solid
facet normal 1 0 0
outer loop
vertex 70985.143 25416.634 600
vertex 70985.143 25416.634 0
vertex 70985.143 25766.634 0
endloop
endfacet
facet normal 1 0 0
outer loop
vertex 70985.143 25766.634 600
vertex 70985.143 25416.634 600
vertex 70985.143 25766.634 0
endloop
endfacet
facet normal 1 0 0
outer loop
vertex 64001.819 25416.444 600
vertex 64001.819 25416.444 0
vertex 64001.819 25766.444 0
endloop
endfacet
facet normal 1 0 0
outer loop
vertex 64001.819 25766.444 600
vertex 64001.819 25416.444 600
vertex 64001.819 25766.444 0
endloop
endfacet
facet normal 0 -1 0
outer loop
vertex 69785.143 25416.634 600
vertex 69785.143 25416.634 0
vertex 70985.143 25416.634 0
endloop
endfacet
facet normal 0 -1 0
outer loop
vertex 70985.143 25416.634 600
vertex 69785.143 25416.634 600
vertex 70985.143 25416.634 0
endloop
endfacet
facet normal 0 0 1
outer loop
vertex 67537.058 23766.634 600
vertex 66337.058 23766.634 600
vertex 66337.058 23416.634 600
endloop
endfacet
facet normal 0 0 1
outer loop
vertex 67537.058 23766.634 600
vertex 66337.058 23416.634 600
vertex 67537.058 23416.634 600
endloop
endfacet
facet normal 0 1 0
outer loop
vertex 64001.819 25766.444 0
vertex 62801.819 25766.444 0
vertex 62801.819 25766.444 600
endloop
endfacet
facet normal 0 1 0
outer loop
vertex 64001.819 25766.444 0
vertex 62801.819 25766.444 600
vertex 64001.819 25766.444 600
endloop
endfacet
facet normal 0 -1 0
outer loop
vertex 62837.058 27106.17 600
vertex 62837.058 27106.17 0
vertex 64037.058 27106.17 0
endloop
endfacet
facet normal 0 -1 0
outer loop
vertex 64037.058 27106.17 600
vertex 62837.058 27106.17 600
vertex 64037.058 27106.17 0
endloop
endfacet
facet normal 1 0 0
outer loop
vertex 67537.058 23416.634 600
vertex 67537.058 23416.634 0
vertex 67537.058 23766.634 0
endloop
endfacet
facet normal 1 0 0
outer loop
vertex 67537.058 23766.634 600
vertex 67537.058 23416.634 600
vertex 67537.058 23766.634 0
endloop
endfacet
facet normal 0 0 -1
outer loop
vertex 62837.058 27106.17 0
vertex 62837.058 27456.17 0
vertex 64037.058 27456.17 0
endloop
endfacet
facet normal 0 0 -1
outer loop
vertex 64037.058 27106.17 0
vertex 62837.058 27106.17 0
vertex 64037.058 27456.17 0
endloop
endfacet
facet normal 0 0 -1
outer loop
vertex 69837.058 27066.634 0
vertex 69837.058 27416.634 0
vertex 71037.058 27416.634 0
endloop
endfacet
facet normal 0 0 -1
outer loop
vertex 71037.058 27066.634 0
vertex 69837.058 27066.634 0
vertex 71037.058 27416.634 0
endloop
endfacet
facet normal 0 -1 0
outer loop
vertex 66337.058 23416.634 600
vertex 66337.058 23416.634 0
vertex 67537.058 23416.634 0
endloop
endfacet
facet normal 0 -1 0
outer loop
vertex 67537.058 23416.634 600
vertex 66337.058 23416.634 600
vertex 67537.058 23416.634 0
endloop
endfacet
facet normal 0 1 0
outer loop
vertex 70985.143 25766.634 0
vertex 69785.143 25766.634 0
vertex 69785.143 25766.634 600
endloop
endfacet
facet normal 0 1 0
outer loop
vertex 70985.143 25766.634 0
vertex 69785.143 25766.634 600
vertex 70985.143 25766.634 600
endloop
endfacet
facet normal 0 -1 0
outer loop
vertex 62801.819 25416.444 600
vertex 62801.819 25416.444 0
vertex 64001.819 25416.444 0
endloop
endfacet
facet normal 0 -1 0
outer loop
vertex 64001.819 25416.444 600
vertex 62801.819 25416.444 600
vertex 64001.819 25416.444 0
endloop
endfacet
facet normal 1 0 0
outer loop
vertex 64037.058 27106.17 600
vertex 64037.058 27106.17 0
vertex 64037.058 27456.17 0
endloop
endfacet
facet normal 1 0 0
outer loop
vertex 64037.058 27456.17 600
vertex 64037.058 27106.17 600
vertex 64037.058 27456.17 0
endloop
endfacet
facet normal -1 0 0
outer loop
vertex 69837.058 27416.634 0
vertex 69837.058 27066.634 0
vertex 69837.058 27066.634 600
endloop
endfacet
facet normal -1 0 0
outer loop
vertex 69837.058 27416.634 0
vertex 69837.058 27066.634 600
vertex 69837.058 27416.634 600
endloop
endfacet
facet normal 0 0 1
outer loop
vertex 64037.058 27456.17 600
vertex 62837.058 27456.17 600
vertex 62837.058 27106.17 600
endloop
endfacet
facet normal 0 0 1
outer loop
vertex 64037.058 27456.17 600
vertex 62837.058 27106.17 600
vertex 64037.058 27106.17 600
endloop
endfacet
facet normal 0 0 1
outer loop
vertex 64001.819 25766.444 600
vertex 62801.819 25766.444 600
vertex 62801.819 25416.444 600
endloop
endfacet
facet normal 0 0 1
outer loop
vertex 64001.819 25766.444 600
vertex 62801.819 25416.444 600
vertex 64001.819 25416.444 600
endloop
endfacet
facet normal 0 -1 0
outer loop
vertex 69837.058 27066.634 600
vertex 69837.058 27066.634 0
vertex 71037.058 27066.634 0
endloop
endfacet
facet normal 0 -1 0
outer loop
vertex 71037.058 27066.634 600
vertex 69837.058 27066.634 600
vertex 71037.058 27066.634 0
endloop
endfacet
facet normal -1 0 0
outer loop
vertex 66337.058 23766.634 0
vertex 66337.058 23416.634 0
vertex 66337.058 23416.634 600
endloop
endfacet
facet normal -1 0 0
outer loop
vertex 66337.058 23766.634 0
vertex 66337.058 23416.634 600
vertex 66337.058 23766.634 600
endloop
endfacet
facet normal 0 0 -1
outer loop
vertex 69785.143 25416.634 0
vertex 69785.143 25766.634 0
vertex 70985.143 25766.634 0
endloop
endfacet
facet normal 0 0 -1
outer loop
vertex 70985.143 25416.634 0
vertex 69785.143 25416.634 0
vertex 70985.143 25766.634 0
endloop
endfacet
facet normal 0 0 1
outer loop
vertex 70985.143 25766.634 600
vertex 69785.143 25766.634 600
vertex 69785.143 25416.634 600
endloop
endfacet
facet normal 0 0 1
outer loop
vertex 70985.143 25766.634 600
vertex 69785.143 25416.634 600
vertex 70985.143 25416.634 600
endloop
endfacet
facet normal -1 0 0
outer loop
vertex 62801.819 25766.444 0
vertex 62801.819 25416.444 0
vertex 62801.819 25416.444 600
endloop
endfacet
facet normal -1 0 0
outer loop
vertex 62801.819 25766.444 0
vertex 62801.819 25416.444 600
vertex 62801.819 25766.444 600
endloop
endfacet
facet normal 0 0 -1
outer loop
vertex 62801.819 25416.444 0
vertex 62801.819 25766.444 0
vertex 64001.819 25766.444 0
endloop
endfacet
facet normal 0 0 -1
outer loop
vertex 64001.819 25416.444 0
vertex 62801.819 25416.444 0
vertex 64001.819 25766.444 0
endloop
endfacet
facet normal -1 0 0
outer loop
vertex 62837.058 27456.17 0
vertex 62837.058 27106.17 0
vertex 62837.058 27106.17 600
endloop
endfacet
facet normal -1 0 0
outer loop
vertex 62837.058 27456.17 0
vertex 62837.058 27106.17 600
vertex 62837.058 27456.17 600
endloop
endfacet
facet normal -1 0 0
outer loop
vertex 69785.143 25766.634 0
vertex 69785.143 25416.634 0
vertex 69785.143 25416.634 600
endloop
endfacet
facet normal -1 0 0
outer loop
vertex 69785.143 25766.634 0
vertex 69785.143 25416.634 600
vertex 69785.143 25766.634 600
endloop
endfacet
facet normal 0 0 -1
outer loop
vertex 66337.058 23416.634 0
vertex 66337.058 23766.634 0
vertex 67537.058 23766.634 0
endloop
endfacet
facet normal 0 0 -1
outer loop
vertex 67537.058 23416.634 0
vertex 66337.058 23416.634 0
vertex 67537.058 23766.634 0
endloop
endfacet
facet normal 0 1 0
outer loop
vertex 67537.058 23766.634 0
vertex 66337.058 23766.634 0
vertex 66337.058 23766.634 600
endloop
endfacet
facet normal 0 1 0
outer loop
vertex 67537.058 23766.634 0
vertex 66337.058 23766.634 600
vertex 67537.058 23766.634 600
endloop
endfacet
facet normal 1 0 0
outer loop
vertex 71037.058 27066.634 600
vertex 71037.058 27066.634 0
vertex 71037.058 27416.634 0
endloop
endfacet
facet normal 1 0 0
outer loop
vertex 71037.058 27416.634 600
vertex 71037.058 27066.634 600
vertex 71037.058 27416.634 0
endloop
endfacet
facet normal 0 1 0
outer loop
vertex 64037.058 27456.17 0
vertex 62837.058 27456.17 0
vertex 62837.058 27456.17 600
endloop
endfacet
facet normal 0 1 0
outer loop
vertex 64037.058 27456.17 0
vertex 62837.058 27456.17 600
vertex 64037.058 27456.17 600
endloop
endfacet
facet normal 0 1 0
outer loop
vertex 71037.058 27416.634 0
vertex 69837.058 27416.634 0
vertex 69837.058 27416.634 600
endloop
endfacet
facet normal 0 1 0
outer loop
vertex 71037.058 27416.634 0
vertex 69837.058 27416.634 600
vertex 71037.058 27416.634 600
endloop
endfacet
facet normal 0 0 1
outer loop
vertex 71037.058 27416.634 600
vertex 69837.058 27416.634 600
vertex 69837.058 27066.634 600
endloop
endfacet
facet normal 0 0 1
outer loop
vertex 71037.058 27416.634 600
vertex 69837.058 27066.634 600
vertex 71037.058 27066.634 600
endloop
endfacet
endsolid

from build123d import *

# Parameters (mm, degrees)
SKETCH1_W        = 1200
SKETCH1_H        = 350
EXTRUDE1_DEPTH   = 600
EXTRUDE1_2_DEPTH = 600
EXTRUDE1_3_DEPTH = 600
EXTRUDE1_4_DEPTH = 600
EXTRUDE1_5_DEPTH = 600


with BuildPart() as part:
    # Sketch1 → Extrude1 (new body)
    with BuildSketch(Plane.XY):
        with Locations((66937.057737679, 23591.633625626)):
            Rectangle(SKETCH1_W, SKETCH1_H)
    extrude(amount=EXTRUDE1_DEPTH)


with BuildPart() as body_2:
    # Sketch1 → Extrude1 2 (new body)
    with BuildSketch(Plane.XY):
        with Locations((70385.142636984, 25591.633625626)):
            Rectangle(SKETCH1_W, SKETCH1_H)
    extrude(amount=EXTRUDE1_2_DEPTH)


with BuildPart() as body_3:
    # Sketch1 → Extrude1 3 (new body)
    with BuildSketch(Plane.XY):
        with Locations((70437.057737679, 27241.633625626)):
            Rectangle(SKETCH1_W, SKETCH1_H)
    extrude(amount=EXTRUDE1_3_DEPTH)


with BuildPart() as body_4:
    # Sketch1 → Extrude1 4 (new body)
    with BuildSketch(Plane.XY):
        with Locations((63437.057737679, 27281.170364801)):
            Rectangle(SKETCH1_W, SKETCH1_H)
    extrude(amount=EXTRUDE1_4_DEPTH)


with BuildPart() as body_5:
    # Sketch1 → Extrude1 5 (new body)
    with BuildSketch(Plane.XY):
        with Locations((63401.819180271, 25591.443706088)):
            Rectangle(SKETCH1_W, SKETCH1_H)
    extrude(amount=EXTRUDE1_5_DEPTH)


solid = Compound([part.part, body_2.part, body_3.part, body_4.part, body_5.part])
